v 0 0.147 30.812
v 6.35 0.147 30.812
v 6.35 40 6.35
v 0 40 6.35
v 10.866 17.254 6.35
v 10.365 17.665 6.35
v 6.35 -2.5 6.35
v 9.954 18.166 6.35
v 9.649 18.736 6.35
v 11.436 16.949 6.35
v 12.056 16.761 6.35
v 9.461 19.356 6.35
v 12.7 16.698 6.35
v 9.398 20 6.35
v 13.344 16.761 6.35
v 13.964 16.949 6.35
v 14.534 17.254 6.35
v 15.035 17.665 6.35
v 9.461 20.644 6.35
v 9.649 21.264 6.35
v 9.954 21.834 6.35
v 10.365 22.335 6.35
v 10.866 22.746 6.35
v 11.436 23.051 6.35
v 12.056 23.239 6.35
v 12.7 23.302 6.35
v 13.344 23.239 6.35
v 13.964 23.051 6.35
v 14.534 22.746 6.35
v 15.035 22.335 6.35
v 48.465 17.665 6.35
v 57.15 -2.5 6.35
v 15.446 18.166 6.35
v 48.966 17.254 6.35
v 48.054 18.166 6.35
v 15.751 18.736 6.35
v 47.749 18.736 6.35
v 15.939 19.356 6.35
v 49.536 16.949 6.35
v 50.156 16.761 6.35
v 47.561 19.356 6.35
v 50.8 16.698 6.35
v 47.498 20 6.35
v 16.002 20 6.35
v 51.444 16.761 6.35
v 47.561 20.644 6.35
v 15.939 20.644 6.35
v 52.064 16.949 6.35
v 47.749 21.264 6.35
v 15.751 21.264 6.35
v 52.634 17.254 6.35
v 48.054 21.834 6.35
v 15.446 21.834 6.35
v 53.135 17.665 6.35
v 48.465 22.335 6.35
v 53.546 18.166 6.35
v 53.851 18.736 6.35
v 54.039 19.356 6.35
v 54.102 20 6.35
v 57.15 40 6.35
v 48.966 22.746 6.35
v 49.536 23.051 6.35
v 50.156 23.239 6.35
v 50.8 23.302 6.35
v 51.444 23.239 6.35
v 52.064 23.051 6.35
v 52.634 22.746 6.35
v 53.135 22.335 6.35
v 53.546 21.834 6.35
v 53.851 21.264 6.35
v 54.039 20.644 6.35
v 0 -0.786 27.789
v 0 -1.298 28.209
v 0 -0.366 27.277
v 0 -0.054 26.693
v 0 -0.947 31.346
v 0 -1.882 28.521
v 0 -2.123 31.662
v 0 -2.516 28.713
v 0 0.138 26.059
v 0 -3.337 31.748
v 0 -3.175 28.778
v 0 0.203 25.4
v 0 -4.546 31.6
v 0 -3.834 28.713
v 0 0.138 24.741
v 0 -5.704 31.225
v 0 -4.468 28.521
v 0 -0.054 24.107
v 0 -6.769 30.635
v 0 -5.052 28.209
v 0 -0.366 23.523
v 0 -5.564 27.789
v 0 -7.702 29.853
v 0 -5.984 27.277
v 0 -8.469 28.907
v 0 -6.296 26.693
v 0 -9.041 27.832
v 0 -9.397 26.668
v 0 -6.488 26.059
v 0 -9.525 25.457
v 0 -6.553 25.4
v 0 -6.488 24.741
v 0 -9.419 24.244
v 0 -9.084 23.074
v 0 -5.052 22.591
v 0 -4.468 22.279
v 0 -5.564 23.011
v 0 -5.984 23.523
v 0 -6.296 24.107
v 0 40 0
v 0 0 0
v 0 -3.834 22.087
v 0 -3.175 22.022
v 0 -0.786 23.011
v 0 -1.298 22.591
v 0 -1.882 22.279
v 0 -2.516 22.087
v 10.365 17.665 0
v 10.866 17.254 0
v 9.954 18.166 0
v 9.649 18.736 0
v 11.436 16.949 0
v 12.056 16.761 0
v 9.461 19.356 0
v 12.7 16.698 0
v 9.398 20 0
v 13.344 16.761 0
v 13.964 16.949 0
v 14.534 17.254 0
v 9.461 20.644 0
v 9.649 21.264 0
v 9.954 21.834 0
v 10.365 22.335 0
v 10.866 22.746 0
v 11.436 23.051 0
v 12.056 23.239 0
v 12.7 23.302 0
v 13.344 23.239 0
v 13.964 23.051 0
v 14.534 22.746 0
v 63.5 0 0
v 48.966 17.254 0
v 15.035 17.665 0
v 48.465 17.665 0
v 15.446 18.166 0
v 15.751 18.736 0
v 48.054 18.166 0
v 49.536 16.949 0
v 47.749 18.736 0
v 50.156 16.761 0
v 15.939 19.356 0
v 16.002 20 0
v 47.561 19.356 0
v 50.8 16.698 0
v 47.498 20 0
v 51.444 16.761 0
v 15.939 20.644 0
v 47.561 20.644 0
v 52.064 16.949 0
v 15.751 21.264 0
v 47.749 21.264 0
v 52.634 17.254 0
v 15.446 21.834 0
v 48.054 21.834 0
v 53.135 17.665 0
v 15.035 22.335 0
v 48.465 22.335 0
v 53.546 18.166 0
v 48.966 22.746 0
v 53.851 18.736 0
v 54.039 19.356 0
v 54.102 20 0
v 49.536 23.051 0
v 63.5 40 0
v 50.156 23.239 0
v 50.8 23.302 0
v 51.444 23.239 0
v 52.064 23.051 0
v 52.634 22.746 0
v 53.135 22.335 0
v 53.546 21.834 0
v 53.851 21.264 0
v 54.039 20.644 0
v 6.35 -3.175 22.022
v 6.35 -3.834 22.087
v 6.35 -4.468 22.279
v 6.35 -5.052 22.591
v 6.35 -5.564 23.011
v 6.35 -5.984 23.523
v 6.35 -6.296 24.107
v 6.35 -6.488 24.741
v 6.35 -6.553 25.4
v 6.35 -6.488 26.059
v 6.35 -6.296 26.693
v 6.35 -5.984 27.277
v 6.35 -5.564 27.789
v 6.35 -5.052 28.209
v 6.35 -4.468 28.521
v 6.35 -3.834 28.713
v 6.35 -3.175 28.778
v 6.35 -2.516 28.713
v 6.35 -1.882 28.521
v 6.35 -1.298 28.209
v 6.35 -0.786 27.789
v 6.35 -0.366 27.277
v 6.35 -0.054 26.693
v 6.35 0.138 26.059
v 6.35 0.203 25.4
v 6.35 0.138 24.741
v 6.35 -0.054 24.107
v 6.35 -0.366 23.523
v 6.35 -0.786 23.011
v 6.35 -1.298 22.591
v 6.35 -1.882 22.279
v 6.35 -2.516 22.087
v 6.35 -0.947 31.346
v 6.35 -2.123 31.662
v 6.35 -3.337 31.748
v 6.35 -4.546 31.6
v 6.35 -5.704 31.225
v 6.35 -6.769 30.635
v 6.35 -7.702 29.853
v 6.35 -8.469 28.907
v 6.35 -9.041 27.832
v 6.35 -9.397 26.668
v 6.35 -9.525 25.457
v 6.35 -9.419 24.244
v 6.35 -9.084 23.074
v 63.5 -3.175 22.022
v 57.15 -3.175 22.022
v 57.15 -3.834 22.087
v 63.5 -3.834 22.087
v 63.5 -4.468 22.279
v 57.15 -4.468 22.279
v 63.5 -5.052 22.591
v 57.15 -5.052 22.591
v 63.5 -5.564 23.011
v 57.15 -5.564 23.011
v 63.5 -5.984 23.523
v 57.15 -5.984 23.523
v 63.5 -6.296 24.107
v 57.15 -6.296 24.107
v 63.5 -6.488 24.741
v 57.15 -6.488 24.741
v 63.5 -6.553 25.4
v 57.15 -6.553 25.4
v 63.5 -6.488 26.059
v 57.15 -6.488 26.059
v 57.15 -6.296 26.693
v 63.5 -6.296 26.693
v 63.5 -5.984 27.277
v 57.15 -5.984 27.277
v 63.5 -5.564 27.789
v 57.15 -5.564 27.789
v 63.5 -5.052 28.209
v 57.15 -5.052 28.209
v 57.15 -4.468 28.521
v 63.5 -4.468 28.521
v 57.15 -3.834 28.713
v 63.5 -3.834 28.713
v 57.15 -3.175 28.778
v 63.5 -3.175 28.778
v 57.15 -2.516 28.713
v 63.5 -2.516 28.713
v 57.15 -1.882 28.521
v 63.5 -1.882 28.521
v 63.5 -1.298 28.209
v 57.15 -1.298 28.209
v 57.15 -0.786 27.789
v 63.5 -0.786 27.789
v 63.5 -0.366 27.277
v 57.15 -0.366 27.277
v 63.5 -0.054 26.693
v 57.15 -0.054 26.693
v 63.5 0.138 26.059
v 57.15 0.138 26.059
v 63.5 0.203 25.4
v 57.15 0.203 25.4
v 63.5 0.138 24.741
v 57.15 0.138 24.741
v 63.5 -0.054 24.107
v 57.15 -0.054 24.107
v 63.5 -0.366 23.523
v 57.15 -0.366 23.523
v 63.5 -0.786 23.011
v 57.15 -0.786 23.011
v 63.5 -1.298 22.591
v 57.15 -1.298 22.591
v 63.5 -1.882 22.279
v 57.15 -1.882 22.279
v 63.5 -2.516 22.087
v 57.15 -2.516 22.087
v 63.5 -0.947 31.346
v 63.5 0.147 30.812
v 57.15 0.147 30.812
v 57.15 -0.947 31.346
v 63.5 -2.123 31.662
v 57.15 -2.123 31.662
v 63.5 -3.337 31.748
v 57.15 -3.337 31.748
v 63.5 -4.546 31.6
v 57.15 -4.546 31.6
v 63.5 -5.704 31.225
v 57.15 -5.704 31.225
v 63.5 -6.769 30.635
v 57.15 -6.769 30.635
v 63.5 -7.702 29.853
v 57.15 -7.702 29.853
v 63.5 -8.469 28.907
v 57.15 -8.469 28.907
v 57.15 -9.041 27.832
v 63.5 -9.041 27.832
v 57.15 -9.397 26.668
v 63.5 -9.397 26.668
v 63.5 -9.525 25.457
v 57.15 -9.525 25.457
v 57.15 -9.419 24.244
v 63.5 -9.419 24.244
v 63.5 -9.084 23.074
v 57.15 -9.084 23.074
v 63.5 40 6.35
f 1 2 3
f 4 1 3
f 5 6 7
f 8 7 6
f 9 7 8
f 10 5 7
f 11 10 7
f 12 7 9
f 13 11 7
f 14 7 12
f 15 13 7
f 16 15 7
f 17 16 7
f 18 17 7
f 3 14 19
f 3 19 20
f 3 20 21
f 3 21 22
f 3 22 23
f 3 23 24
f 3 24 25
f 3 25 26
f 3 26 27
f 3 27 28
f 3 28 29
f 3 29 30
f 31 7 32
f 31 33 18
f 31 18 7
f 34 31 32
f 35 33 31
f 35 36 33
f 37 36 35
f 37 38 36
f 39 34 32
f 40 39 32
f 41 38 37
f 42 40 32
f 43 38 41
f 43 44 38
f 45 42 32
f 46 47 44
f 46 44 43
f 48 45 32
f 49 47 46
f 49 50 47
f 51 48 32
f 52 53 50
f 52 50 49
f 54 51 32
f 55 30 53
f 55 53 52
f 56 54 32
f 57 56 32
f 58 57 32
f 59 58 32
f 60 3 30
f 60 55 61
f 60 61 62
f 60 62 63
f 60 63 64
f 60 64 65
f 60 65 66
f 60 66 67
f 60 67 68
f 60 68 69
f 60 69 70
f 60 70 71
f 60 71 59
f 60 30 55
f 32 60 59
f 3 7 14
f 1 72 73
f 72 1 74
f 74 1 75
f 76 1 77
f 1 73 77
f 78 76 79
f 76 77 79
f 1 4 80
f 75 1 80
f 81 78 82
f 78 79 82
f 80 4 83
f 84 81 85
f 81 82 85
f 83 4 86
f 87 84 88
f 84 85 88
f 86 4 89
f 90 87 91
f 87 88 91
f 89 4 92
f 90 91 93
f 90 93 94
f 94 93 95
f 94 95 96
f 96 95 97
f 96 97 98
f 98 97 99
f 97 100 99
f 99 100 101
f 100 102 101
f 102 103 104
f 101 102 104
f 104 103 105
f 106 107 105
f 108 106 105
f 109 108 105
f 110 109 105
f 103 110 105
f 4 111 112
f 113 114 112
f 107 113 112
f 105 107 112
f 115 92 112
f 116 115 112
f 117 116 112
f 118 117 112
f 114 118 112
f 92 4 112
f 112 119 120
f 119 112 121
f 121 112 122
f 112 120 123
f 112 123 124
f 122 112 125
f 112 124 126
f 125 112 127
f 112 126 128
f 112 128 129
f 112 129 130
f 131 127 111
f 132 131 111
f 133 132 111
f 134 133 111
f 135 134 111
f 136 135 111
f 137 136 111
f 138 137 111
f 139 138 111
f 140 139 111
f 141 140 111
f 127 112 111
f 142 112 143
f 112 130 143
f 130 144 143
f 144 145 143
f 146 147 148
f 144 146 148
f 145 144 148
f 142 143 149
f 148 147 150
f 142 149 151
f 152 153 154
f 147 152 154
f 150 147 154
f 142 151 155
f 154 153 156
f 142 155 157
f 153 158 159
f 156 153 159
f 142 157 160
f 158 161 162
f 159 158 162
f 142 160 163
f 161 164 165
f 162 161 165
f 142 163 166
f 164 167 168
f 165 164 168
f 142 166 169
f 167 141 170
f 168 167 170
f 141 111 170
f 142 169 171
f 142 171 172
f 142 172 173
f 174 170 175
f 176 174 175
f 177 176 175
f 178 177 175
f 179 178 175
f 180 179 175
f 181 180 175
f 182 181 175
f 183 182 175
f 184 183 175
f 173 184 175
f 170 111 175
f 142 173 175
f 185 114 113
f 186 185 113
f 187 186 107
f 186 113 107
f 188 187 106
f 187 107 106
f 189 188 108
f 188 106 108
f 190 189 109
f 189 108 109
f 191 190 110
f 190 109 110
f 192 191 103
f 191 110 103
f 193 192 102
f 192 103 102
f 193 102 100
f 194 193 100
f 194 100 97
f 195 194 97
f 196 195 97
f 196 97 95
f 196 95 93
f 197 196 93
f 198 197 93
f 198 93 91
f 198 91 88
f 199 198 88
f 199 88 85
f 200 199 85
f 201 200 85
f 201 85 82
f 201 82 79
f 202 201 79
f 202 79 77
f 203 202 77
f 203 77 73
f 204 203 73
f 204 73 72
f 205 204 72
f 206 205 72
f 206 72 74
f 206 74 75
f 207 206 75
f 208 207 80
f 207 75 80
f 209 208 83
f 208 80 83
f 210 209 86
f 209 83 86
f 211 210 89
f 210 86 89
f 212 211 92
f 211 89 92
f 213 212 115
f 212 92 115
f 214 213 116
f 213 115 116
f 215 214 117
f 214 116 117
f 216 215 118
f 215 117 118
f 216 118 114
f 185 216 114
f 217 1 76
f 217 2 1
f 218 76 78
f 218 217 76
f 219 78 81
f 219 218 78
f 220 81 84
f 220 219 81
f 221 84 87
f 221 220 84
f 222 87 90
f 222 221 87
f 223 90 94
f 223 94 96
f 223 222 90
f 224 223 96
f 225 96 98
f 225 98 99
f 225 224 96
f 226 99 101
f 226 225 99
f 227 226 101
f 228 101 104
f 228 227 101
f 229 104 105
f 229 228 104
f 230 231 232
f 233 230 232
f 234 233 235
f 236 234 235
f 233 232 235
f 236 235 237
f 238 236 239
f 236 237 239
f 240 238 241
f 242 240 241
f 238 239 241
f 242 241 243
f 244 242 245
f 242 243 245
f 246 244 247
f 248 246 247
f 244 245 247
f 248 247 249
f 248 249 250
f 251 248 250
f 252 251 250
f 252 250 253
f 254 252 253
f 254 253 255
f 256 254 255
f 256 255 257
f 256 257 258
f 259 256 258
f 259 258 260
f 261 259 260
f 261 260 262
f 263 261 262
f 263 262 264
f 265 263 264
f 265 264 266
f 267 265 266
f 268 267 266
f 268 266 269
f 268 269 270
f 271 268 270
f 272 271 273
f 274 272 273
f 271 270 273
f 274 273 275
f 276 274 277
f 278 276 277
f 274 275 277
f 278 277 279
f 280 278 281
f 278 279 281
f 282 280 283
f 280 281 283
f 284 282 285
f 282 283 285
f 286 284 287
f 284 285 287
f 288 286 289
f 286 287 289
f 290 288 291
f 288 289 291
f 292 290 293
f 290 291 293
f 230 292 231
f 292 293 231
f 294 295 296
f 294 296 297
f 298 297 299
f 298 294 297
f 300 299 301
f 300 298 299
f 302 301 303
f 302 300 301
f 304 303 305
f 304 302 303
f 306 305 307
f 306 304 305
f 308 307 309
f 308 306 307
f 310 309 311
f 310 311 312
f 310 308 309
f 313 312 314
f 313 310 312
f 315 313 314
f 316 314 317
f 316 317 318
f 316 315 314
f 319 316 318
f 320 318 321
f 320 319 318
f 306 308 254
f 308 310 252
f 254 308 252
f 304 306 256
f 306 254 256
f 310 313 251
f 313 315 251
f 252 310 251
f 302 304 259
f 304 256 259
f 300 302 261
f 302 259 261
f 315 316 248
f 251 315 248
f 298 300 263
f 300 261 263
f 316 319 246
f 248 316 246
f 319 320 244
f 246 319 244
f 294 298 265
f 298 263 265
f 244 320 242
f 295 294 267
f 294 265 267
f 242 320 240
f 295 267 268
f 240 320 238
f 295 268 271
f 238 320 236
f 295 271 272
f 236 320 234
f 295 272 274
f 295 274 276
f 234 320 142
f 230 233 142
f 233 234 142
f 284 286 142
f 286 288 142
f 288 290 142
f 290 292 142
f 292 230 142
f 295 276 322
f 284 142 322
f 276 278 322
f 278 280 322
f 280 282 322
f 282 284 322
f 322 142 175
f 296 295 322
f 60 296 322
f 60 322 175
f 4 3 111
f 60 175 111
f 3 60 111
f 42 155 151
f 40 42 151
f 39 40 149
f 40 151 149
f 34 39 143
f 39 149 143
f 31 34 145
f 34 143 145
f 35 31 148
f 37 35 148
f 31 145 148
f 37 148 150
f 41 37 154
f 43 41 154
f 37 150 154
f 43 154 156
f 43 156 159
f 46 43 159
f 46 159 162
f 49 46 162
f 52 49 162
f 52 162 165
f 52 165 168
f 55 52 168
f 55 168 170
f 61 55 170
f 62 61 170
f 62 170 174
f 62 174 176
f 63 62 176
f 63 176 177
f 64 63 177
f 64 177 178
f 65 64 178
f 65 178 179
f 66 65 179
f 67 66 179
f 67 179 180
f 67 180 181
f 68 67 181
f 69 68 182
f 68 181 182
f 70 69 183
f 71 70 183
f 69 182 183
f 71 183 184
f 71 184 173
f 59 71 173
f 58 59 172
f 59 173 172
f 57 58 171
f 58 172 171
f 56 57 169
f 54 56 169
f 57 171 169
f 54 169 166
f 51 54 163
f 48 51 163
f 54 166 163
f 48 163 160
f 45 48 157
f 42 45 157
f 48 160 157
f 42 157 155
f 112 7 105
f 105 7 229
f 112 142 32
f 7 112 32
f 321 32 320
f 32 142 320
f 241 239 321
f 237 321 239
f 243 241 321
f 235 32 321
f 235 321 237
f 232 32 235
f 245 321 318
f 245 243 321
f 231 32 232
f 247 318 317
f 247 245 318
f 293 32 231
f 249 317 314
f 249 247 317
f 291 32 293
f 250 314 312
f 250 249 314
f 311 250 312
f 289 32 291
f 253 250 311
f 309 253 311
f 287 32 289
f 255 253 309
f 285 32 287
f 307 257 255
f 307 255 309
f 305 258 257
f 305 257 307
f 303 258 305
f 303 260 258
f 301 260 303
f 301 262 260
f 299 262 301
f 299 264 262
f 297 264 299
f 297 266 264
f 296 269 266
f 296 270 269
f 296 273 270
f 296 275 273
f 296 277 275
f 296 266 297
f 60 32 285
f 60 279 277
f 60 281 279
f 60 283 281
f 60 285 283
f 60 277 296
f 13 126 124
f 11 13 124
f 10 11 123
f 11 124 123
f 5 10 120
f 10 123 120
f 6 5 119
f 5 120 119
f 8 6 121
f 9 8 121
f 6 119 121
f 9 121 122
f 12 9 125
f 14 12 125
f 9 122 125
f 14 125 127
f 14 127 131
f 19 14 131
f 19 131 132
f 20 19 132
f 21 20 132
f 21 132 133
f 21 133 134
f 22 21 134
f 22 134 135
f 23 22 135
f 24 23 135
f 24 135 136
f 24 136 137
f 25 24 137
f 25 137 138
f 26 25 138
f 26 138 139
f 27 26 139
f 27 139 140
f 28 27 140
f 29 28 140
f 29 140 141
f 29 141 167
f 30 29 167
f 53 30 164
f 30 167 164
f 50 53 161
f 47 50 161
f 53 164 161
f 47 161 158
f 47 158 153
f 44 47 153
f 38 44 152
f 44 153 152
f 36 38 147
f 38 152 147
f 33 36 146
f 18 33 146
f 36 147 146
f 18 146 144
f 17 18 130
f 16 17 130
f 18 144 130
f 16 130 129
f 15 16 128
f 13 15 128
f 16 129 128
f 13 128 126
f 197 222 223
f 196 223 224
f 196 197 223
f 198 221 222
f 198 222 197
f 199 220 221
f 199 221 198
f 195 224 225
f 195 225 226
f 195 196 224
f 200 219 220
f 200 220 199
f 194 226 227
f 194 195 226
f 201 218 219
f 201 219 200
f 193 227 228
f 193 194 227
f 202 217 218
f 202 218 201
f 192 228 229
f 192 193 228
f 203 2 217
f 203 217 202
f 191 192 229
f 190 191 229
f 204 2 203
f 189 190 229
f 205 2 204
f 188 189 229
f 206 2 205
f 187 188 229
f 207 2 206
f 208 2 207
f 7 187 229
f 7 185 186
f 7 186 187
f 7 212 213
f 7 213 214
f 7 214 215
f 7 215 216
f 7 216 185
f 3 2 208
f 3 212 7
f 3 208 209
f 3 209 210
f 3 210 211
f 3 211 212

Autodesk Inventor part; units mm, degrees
ref_plane "YZ Plane" through (0, 0, 0) normal (1, 0, 0) x (0, 1, 0)
ref_plane "XZ Plane" through (0, 0, 0) normal (0, 1, 0) x (-1, 0, 0)
ref_plane "XY Plane" through (0, 0, 0) normal (0, 0, 1) x (1, 0, 0)
sketch "Sketch1" plane through (0, 0, 0) normal (0, 0, 1) x (1, 0, 0)
  line L0 (0, 0) -> (63.5, 0)
  line L1 (63.5, 0) -> (63.5, 40)
  line L2 (63.5, 40) -> (0, 40)
  line L3 (0, 40) -> (0, 0)
  dimension "d2" = 40
  dimension "d3" = 63.5
extrude "Extrusion1" add sketch "Sketch1" along normal blind 6.35
sketch "Sketch2" plane through (0, 0, 6.35) normal (0, 0, 1) x (1, 0, 0)
  line L0 (0, 0) -> (0, 40) projected
  line L1 (0, 40) -> (63.5, 40) projected
  line L2 (50.8, 20) -> (12.7, 20)
  point P0 (0, 20)
  point P1 (31.75, 20)
  point P2 (31.75, 40)
  dimension "d4" = 38.1
hole "Hole1" at (12.7, 20, 6.35) at (50.8, 20, 6.35) direction (0, 0, -1) diameter 6.604 end through all clearance for "Flat Head Machine Screw" size "M6" standard "Ansi Metric M Profile"
sketch "Sketch3" plane through (63.5, 0, 0) normal (1, 0, 0) x (0, 0, -1)
  line L0 (-6.35, 40) -> (-6.35, 0) projected
  line L1 (0, 0) -> (-6.35, 0) projected
  line L2 (0, 0) -> (0, 40) projected
  circle A0 centre (-25.4, -3.175) radius 6.35
  line L3 (0, 0) -> (-23.0739, -9.0836)
  line L4 (-30.8119, 0.1468) -> (-6.35, 40)
  dimension "d12" = 12.7
  dimension "d13" = 3.175
  dimension "d14" = 25.4
extrude "Extrusion2" add sketch "Sketch3" against normal up to surface (63.5 mm away)
sketch "Sketch4" plane through (0, 40, 0) normal (0, 1, 0) x (1, 0, 0)
  line L0 (0, -6.35) -> (63.5, -6.35) projected
  line L1 (63.5, 0) -> (63.5, -6.35) projected
  line L2 (0, 0) -> (0, -6.35) projected
  line L3 (6.35, -6.35) -> (57.15, -6.35)
  line L4 (57.15, -6.35) -> (57.15, -38.1)
  line L5 (57.15, -38.1) -> (6.35, -38.1)
  line L6 (6.35, -38.1) -> (6.35, -6.35)
  dimension "d17" = 31.75
  dimension "d18" = 6.35
  dimension "d19" = 6.35
extrude "Extrusion3" cut sketch "Sketch4" against normal through all
hole "Hole2" at (63.5, -3.175, 25.4) direction (-1, 0, 0) diameter 6.7564 end through all clearance for "Flat Head Machine Screw (82)" size "1/4" standard "Ansi Unified Screw Threads"
properties part number "kinect bracket b"
